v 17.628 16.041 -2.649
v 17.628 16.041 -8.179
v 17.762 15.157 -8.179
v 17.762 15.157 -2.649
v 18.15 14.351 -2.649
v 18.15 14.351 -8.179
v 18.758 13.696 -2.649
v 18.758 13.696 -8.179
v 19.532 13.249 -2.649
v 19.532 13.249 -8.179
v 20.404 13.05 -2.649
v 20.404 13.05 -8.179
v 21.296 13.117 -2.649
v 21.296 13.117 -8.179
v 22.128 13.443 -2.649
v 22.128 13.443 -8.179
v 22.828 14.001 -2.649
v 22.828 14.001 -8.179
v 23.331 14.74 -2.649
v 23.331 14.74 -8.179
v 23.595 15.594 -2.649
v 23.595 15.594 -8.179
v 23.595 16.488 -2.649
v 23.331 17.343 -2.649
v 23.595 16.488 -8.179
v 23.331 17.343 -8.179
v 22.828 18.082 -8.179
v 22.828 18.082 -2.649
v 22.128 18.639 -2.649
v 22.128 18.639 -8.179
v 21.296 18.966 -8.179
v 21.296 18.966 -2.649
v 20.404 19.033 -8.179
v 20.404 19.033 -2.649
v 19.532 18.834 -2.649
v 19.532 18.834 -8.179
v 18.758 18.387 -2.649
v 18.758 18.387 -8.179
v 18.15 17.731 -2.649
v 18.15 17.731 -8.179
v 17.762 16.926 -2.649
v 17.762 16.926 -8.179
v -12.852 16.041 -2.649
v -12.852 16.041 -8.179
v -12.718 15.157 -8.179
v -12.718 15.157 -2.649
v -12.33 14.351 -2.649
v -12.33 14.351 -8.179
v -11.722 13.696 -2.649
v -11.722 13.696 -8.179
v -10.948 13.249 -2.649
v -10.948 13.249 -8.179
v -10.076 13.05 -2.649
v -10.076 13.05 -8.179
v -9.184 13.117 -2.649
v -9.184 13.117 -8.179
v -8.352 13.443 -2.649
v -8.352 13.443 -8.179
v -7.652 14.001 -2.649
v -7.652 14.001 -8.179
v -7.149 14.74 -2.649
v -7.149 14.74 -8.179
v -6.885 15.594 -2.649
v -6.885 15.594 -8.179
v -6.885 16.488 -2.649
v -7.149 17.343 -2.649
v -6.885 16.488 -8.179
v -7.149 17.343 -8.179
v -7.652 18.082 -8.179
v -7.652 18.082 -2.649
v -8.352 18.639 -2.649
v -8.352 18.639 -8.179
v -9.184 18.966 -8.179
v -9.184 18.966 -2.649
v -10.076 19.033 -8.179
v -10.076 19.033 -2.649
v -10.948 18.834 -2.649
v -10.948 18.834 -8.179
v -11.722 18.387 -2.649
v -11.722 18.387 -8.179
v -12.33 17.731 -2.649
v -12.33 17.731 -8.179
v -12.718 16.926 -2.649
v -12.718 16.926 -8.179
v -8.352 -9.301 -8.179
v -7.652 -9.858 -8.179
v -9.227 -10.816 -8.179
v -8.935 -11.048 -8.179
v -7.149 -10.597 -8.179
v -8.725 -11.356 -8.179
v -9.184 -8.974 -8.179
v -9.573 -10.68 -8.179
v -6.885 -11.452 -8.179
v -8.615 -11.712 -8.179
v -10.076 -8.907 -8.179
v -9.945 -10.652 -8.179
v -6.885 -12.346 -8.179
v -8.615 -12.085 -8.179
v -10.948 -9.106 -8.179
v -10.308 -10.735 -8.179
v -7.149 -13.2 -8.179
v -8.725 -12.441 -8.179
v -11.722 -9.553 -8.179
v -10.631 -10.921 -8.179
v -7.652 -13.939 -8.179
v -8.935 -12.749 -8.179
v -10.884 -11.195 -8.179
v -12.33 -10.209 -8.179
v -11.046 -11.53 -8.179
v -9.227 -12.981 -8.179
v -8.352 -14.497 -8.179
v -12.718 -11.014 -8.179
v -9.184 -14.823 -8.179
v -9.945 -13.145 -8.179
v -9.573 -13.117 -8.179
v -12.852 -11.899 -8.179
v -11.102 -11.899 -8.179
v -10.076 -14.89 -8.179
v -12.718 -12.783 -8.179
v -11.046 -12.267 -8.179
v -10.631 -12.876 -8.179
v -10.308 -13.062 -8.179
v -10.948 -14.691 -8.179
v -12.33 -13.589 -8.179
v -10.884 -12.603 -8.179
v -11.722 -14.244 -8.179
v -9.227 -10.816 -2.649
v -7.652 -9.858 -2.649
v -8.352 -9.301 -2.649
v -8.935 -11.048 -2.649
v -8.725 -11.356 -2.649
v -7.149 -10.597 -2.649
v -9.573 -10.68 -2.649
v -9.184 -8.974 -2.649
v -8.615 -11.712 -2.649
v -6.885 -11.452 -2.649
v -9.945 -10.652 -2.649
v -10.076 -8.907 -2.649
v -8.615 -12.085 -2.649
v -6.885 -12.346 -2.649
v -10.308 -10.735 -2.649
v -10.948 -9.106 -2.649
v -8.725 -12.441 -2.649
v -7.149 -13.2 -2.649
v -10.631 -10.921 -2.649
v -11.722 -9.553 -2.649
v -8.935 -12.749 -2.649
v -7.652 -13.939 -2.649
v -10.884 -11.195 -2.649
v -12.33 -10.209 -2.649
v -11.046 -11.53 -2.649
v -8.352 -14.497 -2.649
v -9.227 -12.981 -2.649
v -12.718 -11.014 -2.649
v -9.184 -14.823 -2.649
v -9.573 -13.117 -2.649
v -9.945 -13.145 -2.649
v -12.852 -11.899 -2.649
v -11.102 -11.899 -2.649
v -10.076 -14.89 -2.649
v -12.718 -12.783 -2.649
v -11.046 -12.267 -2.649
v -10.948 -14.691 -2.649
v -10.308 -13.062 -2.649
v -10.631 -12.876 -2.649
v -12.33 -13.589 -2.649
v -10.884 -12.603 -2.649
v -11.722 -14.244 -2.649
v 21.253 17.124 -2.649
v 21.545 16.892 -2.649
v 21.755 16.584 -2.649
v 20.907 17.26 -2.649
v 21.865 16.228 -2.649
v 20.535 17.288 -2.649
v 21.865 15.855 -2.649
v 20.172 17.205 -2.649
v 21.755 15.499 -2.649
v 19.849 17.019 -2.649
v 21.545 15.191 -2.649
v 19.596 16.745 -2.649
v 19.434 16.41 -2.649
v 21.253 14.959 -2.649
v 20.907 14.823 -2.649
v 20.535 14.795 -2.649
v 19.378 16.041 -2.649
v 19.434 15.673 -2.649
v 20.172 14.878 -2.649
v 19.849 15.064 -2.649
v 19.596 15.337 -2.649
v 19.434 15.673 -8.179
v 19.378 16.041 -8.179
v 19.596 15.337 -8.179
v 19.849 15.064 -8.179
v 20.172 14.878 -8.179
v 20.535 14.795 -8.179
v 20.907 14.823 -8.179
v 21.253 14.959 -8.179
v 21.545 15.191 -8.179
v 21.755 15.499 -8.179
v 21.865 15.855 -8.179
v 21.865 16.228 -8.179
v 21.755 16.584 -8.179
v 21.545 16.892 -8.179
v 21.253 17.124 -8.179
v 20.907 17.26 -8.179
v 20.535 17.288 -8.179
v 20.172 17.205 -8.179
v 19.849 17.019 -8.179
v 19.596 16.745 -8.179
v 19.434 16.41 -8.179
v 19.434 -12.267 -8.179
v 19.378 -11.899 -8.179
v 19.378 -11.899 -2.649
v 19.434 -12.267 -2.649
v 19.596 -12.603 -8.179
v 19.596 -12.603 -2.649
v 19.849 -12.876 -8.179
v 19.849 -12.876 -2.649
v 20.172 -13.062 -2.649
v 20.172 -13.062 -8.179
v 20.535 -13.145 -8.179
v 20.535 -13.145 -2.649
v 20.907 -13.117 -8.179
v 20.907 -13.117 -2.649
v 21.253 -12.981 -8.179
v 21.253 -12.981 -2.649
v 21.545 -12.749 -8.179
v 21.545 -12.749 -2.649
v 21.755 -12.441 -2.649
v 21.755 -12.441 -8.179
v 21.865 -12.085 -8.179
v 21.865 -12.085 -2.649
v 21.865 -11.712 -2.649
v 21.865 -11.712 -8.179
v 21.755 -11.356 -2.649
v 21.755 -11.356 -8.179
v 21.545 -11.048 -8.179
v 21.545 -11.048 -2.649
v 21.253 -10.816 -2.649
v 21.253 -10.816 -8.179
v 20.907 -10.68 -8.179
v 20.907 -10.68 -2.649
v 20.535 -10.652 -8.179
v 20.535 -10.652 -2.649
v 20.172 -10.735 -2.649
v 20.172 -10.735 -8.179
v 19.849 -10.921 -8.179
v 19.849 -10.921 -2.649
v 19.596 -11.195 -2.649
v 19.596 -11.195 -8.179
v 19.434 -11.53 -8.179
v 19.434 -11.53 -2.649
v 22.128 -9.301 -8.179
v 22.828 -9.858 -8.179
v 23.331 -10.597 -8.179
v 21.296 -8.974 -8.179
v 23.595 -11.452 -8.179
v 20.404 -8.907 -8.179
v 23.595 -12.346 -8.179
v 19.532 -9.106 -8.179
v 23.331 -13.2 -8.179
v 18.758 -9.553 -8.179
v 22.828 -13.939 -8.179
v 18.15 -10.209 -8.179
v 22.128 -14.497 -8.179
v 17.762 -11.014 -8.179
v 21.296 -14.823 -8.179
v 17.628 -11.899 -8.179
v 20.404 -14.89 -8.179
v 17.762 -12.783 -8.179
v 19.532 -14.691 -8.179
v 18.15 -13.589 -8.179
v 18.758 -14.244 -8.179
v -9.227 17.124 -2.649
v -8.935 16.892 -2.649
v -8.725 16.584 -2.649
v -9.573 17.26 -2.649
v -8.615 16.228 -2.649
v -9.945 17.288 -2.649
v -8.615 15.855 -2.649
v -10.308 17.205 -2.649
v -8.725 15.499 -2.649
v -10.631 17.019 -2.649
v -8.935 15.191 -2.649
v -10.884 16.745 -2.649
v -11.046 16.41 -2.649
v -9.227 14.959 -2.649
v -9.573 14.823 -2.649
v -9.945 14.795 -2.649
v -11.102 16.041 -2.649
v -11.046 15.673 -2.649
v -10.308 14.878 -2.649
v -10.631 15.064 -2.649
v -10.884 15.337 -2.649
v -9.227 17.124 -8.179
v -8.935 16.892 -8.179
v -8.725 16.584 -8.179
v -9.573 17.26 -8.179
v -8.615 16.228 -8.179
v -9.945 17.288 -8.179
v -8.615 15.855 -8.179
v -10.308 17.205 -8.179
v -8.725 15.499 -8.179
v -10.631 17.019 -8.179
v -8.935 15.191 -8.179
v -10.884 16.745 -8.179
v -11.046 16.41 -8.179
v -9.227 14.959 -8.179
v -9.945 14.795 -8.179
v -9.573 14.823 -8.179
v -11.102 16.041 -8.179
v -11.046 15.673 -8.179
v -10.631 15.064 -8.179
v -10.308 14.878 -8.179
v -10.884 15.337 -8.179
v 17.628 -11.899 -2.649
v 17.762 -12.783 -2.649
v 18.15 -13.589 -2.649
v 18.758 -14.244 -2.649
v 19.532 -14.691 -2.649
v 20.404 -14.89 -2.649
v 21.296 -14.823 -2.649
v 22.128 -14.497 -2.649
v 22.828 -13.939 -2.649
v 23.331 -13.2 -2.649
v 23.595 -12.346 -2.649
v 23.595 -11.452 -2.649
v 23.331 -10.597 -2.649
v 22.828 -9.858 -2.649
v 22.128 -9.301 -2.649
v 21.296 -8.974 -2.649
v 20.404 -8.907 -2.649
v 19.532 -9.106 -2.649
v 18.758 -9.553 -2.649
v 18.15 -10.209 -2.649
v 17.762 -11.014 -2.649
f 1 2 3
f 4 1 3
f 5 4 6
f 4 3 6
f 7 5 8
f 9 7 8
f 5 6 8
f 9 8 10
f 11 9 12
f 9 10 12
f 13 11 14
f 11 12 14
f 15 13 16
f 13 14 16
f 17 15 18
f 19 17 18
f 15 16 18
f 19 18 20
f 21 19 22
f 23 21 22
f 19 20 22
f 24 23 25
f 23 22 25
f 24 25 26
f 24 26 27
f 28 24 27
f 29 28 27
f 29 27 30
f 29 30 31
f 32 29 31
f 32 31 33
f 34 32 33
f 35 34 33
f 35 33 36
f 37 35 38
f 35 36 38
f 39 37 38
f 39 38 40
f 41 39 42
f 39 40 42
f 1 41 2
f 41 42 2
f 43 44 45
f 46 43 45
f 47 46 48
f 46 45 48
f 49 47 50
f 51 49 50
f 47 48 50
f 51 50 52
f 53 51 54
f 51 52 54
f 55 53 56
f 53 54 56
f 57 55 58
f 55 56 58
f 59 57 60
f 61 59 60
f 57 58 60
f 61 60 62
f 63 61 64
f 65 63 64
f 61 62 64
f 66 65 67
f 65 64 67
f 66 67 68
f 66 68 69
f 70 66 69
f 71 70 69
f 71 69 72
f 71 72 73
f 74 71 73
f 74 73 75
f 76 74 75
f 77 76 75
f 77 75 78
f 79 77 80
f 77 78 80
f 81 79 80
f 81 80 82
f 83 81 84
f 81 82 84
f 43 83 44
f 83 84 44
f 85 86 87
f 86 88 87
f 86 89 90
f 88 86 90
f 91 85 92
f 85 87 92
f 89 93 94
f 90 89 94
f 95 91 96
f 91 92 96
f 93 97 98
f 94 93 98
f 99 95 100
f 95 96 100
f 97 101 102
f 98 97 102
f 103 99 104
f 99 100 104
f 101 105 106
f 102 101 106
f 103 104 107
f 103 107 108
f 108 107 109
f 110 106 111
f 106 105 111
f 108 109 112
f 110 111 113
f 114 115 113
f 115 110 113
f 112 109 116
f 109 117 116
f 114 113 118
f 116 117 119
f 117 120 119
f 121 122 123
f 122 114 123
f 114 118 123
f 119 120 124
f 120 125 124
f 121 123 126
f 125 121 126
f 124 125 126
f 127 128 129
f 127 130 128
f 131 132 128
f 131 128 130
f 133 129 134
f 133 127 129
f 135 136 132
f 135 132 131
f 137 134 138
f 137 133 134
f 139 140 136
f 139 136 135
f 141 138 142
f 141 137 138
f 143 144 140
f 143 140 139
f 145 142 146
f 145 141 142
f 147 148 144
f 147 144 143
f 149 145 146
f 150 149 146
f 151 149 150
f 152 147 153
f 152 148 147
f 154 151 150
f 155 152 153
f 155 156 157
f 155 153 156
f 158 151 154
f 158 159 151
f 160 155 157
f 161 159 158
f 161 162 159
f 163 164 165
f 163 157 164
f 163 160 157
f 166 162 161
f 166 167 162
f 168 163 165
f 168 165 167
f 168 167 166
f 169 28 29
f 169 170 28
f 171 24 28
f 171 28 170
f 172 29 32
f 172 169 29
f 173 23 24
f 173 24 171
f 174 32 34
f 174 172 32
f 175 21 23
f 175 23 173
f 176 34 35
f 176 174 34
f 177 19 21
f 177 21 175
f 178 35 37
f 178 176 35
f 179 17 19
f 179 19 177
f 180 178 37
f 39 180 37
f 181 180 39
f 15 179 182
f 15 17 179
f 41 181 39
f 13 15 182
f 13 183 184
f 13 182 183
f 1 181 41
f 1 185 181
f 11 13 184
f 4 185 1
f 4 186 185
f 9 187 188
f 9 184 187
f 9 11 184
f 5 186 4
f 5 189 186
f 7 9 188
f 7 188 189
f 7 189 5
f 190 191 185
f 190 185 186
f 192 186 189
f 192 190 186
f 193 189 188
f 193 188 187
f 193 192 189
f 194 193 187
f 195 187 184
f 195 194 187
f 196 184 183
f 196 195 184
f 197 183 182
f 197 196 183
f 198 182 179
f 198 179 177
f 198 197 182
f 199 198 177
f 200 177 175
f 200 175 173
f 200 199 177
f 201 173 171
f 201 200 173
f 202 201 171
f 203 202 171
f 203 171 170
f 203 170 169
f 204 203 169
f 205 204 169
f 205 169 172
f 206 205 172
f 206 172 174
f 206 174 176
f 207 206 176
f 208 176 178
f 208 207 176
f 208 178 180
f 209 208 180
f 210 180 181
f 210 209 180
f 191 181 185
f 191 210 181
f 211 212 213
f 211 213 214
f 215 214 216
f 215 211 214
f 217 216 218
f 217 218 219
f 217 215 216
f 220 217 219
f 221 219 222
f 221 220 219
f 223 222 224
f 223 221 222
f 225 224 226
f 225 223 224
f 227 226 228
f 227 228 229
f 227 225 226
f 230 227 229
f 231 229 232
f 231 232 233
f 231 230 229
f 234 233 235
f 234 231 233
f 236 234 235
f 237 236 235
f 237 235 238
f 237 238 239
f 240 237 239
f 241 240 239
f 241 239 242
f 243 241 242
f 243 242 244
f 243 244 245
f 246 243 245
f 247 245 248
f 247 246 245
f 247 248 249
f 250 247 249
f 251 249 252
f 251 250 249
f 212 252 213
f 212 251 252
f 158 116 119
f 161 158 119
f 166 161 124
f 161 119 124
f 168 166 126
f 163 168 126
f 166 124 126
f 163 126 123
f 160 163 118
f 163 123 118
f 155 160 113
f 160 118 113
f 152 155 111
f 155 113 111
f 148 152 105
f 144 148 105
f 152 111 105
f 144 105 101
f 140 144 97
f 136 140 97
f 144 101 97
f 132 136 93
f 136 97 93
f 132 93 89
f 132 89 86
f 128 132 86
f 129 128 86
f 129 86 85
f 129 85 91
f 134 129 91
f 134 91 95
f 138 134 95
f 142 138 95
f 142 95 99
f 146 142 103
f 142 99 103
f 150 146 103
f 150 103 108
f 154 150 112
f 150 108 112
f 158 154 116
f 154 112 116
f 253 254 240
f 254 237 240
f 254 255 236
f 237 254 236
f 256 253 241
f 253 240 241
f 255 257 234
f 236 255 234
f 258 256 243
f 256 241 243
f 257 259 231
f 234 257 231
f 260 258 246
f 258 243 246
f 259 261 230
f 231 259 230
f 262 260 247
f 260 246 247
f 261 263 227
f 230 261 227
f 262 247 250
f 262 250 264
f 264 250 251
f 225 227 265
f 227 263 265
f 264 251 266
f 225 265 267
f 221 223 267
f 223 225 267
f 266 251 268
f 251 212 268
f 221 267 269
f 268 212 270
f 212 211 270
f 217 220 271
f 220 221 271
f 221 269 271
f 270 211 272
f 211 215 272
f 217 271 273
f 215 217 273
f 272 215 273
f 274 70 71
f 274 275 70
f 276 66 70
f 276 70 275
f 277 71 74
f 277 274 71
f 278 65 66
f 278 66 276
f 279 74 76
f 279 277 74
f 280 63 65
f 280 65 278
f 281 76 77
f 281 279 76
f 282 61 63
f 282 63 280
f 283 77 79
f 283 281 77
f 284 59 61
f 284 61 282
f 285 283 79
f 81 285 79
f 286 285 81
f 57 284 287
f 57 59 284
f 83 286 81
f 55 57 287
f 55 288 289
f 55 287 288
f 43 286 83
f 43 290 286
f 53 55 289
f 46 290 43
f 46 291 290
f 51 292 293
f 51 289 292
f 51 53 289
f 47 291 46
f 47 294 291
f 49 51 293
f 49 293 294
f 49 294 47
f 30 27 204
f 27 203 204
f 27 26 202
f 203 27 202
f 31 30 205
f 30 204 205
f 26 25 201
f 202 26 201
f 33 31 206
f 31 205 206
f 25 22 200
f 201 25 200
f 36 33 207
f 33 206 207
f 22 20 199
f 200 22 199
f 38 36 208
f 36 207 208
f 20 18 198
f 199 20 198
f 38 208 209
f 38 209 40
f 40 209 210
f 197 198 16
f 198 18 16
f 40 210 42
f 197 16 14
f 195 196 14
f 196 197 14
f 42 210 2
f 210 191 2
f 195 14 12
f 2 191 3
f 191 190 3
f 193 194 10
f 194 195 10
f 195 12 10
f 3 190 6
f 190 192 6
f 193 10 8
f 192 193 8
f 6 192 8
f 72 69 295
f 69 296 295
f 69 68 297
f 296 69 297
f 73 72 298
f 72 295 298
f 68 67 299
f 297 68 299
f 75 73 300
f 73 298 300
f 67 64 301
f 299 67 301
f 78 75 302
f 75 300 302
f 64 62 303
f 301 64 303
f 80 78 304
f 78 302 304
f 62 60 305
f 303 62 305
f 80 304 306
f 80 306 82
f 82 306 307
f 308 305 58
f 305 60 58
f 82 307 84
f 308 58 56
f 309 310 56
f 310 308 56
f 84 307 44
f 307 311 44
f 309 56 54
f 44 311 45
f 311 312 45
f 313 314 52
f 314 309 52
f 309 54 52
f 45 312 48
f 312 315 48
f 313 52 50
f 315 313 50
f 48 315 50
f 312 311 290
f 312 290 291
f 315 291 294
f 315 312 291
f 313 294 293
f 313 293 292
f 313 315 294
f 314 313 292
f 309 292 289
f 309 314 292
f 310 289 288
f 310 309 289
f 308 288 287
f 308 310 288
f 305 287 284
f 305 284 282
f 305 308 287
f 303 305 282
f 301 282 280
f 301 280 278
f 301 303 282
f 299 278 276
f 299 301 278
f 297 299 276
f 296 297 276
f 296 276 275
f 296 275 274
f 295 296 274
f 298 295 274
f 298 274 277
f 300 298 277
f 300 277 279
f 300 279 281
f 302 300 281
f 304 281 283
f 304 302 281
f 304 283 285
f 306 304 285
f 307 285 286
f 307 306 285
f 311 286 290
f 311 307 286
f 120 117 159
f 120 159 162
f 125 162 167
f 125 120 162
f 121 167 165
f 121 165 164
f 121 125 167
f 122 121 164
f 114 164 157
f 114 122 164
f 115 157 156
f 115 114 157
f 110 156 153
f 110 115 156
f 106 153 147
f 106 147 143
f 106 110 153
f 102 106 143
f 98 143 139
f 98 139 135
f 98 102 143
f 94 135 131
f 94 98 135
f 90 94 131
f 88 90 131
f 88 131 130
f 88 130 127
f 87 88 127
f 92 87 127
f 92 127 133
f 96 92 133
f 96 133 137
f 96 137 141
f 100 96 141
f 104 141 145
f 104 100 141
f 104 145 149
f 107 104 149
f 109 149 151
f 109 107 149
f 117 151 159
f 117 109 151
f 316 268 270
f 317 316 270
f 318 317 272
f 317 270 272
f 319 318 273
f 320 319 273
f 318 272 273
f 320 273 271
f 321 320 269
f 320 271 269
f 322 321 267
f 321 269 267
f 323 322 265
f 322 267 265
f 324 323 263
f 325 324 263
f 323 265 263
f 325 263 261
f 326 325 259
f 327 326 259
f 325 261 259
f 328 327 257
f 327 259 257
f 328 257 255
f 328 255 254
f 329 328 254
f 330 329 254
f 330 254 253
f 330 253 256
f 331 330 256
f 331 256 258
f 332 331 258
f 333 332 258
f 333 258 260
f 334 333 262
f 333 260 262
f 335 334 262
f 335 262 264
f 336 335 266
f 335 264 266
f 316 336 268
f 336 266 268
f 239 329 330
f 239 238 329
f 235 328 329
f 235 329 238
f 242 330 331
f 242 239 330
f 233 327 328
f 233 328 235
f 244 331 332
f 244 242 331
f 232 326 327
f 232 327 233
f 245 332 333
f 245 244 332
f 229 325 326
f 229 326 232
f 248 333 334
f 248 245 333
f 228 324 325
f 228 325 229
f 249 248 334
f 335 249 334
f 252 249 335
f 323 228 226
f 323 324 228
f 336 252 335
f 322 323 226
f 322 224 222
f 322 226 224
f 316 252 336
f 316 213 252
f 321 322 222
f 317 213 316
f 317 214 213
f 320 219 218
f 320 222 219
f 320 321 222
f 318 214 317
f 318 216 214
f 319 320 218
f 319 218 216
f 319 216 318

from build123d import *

# Parameters (mm, degrees)
SKETCH2_R             = 3
SKETCH2_R_2           = 1.25
BOSS_EXTRUDE2_DEPTH   = 5.53
BOSS_EXTRUDE2_2_DEPTH = 5.53
BOSS_EXTRUDE2_3_DEPTH = 5.53
BOSS_EXTRUDE2_4_DEPTH = 5.53


with BuildPart() as part:
    # Sketch2 → Boss-Extrude2 (new body)
    with BuildSketch(Plane.XY.offset(-8.179)):
        with Locations(Location((20.628484132, -11.898689855, 0), (0, 0, 180))):
            Circle(SKETCH2_R)
        with Locations(Location((20.628484132, -11.898689855, 0), (0, 0, 180))):
            Circle(SKETCH2_R_2, mode=Mode.SUBTRACT)
    extrude(amount=BOSS_EXTRUDE2_DEPTH)


with BuildPart() as body_2:
    # Sketch2 → Boss-Extrude2 2 (new body)
    with BuildSketch(Plane.XY.offset(-8.179)):
        with Locations(Location((-9.851515868, -11.898689855, 0), (0, 0, 180))):
            Circle(SKETCH2_R)
        with Locations(Location((-9.851515868, -11.898689855, 0), (0, 0, 180))):
            Circle(SKETCH2_R_2, mode=Mode.SUBTRACT)
    extrude(amount=BOSS_EXTRUDE2_2_DEPTH)


with BuildPart() as body_3:
    # Sketch2 → Boss-Extrude2 3 (new body)
    with BuildSketch(Plane.XY.offset(-8.179)):
        with Locations(Location((-9.851515868, 16.041310145, 0), (0, 0, 180))):
            Circle(SKETCH2_R)
        with Locations(Location((-9.851515868, 16.041310145, 0), (0, 0, 180))):
            Circle(SKETCH2_R_2, mode=Mode.SUBTRACT)
    extrude(amount=BOSS_EXTRUDE2_3_DEPTH)


with BuildPart() as body_4:
    # Sketch2 → Boss-Extrude2 4 (new body)
    with BuildSketch(Plane.XY.offset(-8.179)):
        with Locations(Location((20.628484132, 16.041310145, 0), (0, 0, 180))):
            Circle(SKETCH2_R)
        with Locations(Location((20.628484132, 16.041310145, 0), (0, 0, 180))):
            Circle(SKETCH2_R_2, mode=Mode.SUBTRACT)
    extrude(amount=BOSS_EXTRUDE2_4_DEPTH)


solid = Compound([part.part, body_2.part, body_3.part, body_4.part])
